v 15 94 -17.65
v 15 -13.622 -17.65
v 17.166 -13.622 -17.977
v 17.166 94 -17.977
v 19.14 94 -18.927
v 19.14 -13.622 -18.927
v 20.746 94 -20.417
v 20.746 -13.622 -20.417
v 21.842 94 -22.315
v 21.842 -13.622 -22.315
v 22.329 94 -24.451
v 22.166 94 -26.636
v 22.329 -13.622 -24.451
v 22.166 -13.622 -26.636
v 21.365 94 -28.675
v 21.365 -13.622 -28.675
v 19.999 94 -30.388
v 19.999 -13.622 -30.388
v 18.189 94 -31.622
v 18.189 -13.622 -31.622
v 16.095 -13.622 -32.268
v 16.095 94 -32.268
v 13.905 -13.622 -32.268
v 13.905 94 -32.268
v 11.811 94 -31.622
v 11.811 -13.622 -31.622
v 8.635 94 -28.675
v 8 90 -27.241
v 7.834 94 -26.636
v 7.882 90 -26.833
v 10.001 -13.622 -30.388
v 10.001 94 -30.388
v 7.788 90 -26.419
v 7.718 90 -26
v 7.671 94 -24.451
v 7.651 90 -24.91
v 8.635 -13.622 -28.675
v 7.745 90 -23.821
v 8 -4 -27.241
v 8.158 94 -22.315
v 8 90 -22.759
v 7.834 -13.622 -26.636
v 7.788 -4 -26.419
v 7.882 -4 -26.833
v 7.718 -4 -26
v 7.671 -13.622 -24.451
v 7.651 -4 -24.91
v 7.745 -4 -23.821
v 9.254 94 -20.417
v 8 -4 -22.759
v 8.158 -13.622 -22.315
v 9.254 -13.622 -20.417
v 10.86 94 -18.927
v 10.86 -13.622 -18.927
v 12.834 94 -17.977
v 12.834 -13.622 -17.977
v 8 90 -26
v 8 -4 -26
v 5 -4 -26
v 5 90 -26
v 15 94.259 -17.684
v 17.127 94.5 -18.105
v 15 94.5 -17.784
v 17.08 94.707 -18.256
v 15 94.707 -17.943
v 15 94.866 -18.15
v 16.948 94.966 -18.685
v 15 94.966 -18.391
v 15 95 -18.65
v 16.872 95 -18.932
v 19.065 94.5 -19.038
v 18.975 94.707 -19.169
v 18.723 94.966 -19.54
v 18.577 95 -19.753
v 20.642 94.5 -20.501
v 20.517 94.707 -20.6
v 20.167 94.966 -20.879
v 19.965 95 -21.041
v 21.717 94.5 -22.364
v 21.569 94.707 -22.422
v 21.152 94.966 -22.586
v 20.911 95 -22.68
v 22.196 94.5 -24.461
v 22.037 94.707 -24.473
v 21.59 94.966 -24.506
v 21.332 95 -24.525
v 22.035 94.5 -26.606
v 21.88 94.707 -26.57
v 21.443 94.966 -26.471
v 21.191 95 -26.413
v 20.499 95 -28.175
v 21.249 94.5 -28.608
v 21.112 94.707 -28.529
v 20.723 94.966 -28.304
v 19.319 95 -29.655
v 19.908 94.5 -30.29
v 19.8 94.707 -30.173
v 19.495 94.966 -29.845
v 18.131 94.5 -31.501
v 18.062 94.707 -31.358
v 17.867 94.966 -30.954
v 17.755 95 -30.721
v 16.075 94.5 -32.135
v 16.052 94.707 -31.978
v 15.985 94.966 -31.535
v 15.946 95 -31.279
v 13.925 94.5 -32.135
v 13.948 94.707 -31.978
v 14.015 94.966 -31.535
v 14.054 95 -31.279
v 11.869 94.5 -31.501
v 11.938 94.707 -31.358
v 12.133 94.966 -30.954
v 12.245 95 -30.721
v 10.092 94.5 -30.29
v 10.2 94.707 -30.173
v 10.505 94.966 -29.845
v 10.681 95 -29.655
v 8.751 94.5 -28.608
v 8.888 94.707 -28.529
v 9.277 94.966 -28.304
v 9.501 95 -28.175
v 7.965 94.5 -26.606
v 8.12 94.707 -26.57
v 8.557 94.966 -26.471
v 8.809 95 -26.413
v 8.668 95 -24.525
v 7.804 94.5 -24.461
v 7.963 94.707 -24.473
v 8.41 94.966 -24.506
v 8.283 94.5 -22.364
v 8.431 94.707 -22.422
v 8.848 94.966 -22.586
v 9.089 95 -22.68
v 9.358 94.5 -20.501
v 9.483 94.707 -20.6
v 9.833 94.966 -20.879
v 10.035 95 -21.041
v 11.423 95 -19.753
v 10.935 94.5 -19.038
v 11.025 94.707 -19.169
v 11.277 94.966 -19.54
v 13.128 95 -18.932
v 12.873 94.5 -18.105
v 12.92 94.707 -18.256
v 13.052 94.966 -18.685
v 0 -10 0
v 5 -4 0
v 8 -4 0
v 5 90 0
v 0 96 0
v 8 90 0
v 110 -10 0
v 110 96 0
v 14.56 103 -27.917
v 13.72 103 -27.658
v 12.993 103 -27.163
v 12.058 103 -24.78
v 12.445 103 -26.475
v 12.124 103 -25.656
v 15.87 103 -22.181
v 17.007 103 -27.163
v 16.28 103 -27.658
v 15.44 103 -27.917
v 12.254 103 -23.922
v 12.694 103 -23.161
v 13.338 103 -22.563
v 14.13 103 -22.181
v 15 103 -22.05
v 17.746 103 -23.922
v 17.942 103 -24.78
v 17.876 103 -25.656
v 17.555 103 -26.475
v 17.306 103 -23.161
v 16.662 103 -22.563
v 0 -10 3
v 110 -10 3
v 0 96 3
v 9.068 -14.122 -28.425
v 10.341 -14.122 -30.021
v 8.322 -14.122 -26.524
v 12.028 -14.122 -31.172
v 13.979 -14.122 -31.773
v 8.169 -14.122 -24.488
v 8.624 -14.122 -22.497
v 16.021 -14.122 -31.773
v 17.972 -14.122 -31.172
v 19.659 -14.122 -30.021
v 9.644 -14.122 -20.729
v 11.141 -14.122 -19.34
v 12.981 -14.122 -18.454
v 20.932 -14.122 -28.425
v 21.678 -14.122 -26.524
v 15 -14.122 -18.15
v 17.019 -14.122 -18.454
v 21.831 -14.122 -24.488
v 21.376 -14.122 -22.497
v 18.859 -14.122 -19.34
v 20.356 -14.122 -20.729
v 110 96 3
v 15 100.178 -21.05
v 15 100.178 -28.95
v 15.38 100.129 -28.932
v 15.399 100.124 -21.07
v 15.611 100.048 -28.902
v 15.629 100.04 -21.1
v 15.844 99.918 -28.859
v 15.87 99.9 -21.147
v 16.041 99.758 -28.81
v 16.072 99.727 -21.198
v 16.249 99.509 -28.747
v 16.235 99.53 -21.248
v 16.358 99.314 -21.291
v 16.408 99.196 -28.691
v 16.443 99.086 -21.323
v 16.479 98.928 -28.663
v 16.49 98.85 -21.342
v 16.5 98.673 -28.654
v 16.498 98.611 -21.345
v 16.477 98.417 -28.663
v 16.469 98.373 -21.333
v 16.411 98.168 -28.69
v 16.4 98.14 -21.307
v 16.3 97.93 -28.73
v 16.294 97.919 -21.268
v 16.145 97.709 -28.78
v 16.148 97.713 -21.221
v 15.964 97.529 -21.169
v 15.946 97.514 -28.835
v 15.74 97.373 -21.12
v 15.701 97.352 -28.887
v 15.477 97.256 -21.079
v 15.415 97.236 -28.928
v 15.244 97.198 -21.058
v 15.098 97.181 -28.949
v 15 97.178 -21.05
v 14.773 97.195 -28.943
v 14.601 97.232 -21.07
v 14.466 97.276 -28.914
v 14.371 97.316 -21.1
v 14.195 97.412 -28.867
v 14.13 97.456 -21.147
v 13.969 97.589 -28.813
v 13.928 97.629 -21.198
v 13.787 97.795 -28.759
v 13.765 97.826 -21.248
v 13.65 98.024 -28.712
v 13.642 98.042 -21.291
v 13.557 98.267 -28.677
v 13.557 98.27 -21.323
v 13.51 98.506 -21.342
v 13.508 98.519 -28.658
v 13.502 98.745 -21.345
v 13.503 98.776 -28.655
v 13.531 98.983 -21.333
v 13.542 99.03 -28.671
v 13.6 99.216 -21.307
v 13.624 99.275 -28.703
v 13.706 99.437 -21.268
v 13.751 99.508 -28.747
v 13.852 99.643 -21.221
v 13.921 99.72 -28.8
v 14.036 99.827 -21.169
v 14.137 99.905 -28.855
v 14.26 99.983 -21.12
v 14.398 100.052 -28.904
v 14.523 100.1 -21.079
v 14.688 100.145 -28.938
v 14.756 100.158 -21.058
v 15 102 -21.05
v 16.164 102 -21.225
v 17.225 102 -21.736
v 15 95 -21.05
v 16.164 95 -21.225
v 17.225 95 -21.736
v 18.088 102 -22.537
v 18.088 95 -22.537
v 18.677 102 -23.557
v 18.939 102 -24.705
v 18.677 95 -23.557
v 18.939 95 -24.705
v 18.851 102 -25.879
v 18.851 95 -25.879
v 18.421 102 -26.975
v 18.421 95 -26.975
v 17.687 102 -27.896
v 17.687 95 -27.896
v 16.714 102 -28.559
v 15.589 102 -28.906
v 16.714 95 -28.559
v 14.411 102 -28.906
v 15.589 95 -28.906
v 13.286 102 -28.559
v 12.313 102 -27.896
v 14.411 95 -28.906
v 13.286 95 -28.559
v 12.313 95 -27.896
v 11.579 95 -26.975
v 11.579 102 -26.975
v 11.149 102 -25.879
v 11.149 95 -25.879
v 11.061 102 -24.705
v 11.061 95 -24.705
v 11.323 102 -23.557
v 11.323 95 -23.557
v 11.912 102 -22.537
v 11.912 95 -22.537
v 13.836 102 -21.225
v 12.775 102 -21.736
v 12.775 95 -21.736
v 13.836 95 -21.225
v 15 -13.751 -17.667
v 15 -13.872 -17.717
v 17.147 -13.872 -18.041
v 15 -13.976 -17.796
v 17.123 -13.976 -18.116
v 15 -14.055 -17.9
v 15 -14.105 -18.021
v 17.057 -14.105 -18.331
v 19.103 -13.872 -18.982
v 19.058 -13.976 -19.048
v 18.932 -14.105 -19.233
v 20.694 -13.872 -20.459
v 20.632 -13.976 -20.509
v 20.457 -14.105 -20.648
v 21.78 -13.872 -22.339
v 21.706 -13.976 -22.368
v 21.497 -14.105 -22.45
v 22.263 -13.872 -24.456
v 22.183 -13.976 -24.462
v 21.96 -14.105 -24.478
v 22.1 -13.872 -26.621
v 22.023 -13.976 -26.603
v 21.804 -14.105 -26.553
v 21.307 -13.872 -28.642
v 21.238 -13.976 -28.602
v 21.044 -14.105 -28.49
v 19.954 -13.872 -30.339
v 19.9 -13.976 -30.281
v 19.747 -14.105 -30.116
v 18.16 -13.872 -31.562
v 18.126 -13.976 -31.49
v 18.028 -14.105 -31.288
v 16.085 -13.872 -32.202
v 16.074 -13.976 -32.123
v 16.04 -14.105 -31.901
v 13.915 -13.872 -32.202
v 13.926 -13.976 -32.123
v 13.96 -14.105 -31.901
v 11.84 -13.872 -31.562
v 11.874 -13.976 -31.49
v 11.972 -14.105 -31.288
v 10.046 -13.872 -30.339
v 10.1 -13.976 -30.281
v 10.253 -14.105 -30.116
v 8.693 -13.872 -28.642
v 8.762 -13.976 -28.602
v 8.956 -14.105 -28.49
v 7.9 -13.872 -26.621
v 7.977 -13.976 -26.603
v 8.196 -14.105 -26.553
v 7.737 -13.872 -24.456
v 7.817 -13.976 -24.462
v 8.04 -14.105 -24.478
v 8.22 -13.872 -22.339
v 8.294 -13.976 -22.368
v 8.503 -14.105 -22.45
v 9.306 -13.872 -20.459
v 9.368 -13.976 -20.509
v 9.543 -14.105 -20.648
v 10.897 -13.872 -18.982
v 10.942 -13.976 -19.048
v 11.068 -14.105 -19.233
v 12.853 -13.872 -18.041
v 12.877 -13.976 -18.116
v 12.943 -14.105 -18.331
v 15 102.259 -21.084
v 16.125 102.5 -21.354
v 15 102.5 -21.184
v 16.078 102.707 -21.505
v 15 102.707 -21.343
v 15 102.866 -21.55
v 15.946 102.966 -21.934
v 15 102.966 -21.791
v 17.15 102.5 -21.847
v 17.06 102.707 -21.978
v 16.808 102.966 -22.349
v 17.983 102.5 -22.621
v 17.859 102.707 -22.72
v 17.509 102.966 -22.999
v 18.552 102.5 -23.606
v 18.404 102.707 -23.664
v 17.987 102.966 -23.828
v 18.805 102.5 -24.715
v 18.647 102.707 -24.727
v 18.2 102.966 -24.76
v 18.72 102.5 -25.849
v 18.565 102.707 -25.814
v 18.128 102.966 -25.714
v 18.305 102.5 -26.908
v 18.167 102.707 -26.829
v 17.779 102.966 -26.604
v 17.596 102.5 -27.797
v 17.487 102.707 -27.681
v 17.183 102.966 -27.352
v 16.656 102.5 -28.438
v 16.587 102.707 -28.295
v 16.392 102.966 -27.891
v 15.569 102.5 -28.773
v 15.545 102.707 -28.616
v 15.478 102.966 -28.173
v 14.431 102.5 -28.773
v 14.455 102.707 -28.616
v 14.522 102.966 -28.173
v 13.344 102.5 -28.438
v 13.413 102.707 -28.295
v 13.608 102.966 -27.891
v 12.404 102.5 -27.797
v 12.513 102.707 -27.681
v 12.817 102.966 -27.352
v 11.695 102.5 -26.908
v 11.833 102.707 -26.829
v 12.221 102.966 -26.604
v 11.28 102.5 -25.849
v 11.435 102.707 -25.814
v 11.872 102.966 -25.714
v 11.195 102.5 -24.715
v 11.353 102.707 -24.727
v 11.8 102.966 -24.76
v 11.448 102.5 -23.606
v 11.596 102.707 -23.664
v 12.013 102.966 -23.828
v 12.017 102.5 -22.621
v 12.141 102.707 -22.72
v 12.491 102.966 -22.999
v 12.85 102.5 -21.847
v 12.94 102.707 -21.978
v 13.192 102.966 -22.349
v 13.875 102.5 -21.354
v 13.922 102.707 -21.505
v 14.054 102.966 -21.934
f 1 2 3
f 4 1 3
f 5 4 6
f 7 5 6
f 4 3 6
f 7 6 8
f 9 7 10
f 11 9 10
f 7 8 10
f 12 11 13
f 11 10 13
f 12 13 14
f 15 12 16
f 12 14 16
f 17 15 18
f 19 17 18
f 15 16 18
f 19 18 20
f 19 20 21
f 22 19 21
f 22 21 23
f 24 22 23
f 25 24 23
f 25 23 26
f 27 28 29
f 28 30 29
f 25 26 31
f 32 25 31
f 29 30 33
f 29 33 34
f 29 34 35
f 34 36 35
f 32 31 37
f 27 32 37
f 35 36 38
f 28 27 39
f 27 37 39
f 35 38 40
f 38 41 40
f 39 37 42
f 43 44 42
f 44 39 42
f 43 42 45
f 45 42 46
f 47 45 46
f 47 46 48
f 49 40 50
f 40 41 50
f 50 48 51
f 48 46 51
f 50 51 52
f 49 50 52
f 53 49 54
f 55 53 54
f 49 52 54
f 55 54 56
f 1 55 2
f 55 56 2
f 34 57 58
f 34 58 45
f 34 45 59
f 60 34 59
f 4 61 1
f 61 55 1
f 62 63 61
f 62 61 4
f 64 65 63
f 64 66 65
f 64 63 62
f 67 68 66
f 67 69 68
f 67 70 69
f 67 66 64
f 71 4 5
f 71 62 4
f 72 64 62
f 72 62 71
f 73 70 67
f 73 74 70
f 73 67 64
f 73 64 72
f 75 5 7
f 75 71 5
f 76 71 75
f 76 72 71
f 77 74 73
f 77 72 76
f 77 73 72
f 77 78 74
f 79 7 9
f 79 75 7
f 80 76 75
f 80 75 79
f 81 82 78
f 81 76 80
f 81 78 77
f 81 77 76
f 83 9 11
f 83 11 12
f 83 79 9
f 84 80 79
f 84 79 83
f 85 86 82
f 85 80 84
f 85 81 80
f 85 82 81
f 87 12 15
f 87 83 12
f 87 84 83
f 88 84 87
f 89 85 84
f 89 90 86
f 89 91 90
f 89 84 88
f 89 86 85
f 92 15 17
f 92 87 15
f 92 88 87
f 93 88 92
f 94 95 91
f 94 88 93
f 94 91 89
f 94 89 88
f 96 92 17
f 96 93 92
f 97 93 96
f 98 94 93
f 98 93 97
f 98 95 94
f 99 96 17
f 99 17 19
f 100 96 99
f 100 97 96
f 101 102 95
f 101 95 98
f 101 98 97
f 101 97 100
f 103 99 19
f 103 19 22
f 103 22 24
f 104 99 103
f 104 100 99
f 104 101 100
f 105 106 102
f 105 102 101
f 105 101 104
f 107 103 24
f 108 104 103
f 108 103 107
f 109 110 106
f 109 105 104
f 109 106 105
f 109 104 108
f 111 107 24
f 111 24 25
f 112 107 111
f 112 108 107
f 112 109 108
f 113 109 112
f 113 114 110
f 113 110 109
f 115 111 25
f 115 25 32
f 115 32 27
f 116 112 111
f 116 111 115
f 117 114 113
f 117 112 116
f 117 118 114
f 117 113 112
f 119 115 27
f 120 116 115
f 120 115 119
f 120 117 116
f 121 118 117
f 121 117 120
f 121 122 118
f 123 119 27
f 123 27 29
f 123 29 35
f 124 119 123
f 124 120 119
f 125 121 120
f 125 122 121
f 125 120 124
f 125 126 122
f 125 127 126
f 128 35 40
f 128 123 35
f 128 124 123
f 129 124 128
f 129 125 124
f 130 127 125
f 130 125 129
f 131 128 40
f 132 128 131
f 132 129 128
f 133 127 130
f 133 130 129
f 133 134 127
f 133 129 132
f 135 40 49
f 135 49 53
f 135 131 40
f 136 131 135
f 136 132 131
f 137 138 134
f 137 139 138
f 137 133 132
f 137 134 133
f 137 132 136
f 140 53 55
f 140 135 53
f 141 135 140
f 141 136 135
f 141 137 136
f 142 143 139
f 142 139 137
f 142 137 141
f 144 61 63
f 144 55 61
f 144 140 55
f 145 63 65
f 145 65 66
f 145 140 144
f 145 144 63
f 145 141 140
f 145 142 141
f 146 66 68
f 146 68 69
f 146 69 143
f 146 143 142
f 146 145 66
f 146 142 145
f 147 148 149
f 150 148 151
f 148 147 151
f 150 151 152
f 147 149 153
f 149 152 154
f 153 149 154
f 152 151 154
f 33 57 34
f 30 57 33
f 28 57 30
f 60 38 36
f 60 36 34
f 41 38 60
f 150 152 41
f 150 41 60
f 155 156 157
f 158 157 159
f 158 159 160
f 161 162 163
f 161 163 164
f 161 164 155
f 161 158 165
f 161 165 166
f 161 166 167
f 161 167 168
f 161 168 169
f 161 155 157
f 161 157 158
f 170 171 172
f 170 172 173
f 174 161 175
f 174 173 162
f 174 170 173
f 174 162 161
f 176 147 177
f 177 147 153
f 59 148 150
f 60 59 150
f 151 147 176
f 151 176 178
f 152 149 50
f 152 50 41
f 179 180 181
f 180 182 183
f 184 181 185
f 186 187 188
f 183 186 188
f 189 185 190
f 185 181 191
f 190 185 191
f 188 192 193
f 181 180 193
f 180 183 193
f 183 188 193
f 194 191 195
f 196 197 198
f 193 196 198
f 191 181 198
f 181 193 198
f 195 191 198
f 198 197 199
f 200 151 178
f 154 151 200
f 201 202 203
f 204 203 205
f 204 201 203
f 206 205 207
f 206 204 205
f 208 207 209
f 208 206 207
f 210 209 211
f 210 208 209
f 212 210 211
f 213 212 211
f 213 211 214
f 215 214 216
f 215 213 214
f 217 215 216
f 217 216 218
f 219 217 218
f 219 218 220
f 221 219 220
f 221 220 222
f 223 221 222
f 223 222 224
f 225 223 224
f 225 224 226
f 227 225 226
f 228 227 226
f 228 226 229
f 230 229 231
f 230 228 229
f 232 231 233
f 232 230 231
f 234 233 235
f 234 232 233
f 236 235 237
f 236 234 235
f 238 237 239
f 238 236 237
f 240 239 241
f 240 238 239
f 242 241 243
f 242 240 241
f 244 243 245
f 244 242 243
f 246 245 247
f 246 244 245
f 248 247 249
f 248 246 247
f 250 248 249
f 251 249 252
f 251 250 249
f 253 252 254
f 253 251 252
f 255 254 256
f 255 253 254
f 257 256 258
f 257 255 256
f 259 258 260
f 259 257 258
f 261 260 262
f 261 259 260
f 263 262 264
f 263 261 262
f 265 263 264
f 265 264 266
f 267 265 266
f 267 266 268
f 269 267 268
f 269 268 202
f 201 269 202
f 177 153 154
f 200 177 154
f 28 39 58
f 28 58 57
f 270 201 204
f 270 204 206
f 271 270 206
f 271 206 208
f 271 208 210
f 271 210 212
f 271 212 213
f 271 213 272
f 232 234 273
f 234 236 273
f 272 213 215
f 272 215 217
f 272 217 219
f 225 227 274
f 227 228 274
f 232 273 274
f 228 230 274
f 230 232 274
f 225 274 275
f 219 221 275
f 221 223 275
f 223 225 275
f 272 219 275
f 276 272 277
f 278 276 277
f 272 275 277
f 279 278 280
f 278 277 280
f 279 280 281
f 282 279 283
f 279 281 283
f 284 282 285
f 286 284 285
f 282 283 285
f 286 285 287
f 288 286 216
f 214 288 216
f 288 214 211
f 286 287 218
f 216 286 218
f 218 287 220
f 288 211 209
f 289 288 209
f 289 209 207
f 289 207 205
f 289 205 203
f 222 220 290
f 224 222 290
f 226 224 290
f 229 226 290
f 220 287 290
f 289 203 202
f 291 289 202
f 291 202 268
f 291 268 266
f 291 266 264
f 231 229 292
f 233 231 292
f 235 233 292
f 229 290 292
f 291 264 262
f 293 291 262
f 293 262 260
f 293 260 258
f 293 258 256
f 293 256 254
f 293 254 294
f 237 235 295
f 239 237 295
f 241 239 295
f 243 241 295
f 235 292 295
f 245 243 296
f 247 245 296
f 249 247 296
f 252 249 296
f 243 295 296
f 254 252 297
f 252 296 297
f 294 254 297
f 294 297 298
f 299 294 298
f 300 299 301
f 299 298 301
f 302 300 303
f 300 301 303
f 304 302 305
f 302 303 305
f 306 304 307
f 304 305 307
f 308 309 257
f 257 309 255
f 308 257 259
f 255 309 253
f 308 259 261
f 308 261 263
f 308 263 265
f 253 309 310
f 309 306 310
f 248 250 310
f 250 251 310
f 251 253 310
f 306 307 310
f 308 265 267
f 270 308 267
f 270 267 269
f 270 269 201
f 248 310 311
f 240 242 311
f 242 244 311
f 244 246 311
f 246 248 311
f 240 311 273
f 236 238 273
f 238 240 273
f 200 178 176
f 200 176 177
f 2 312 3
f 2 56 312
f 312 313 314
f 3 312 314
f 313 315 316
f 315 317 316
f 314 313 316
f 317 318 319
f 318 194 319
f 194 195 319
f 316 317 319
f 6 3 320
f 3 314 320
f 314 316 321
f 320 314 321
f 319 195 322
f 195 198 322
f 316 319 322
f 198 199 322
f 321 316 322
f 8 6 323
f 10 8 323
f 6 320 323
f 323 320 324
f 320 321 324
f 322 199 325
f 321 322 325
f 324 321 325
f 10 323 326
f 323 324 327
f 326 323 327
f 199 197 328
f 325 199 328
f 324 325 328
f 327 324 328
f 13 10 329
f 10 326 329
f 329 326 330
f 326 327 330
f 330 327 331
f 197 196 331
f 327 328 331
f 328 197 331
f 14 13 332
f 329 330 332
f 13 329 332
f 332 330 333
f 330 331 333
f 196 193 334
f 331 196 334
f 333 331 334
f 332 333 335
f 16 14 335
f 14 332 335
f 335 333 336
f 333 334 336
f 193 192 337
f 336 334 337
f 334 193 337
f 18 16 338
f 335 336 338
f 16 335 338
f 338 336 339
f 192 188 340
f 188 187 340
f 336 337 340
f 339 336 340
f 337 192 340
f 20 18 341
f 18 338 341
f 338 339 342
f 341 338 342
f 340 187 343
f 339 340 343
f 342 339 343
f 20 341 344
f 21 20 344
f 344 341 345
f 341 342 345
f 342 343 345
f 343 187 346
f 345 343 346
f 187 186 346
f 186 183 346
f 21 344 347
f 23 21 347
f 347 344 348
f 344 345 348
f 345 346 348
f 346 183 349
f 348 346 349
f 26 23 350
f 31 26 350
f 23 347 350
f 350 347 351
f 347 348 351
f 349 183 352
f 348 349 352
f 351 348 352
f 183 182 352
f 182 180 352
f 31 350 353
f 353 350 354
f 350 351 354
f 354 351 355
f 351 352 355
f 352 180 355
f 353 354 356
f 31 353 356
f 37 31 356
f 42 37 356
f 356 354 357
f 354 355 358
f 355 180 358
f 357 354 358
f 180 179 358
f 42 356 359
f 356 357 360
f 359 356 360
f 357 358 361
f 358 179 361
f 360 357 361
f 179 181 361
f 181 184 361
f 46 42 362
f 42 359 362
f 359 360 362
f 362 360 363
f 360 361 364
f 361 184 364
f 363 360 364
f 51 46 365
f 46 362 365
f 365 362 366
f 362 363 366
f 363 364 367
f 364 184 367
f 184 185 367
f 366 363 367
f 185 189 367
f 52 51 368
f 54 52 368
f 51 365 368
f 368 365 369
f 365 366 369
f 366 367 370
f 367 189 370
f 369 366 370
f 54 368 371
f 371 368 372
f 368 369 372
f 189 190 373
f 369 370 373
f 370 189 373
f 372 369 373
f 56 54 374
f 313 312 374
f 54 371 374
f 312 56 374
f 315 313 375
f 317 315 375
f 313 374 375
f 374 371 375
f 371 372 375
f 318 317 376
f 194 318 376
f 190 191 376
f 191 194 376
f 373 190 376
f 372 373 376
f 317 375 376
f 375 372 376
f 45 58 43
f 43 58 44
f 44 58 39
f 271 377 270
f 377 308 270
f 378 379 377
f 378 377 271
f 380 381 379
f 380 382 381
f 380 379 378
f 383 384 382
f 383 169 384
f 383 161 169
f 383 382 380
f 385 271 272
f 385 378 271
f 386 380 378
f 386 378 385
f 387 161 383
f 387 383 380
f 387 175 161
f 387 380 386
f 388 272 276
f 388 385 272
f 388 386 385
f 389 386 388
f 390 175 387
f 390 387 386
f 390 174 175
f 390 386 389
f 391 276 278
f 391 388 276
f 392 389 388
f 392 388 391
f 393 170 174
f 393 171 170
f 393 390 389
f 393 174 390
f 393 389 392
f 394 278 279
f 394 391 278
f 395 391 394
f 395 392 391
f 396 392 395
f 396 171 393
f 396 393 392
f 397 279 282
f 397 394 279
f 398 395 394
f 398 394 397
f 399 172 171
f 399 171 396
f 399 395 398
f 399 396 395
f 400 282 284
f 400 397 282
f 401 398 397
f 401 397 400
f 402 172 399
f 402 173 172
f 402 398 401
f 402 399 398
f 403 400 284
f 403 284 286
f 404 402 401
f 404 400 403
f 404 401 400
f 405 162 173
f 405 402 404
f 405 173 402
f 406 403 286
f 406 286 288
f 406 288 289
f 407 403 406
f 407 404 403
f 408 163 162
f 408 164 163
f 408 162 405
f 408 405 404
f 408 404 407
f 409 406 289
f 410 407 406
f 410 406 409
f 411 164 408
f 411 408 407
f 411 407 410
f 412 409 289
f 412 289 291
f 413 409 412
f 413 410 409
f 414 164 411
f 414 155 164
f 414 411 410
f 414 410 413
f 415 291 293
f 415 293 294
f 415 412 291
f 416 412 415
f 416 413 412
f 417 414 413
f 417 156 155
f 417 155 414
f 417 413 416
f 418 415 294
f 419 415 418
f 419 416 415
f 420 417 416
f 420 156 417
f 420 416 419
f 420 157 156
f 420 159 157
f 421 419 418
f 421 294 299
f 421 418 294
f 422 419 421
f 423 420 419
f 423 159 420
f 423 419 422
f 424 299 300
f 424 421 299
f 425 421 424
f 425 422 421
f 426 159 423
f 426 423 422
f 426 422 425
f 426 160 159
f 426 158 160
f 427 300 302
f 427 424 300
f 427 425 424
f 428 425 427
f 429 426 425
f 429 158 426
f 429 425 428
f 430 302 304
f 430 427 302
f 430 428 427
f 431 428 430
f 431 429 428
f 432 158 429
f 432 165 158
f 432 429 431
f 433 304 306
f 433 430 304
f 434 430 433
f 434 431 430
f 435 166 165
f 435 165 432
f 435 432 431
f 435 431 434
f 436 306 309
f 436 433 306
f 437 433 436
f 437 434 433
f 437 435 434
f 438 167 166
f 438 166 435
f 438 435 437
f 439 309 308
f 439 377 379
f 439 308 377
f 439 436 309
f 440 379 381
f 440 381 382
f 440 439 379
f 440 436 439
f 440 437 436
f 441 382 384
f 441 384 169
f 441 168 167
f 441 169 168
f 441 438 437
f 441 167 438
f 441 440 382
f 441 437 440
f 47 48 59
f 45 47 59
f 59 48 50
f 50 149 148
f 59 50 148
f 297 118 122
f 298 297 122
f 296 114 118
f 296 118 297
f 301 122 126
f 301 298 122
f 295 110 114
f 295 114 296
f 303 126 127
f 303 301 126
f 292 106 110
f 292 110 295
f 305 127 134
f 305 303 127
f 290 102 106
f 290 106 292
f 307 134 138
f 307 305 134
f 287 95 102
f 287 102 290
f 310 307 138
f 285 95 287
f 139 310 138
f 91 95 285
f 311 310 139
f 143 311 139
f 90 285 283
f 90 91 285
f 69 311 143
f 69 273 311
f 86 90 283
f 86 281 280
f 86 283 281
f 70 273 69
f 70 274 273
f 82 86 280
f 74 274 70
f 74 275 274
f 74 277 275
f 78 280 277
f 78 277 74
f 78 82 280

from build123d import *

# Parameters (mm, degrees)
SKETCH_1_W               = 110
SKETCH_1_H               = 106
EXTRUDE_1_DEPTH          = 3
SKETCH_2_W               = 3
SKETCH_2_H               = 94
EXTRUDE_2_DEPTH          = 38
EXTRUDE_3_DEPTH          = 5
EXTRUDE_3_DEPTH_BACK     = 104.122011
SKETCH_4_R               = 7.35
SKETCH_5_R               = 3.95
EXTRUDE_4_DEPTH          = 8
FILLET_2_R               = 1
CUT_EXTRUDE_1_DEPTH      = 155.044806793
CUT_EXTRUDE_1_DEPTH_BACK = 155.044806793
SKETCH_9_R               = 1.5
FILLET_3_R               = 0.5
SKETCH_11_W              = 3
SKETCH_11_H              = 94
CUT_EXTRUDE_3_DEPTH      = 12


with BuildPart() as part:
    # 草图1 → 凸台-拉伸1 (new body)
    with BuildSketch(Plane.XY):
        with Locations((55, 43)):
            Rectangle(SKETCH_1_W, SKETCH_1_H)
    extrude(amount=EXTRUDE_1_DEPTH)

    # 草图2 → 凸台-拉伸2 (add)
    with BuildSketch(Plane(origin=(0, 0, 0), x_dir=(-1, 0, 0), z_dir=(0, 0, -1))):
        with Locations((-6.5, 43)):
            Rectangle(SKETCH_2_W, SKETCH_2_H)
    extrude(amount=EXTRUDE_2_DEPTH)

    # 草图4 → 凸台-拉伸3 (add, two sides: drawn at the far end of the back side and taken through both)
    with BuildSketch(Plane(origin=(0, 90, 0), x_dir=(1, 0, 0), z_dir=(0, 1, 0)).offset(-EXTRUDE_3_DEPTH_BACK)):
        with Locations(Location((15, 25, 0), (0, 0, 270))):
            Circle(SKETCH_4_R)
    extrude(amount=EXTRUDE_3_DEPTH + EXTRUDE_3_DEPTH_BACK)

    # 草图5 → 凸台-拉伸4 (add)
    with BuildSketch(Plane(origin=(0, 95, 0), x_dir=(1, 0, 0), z_dir=(0, 1, 0))):
        with Locations(Location((15, 25, 0), (0, 0, 270))):
            Circle(SKETCH_5_R)
    extrude(amount=EXTRUDE_4_DEPTH)

    # 圆角2
    fillet_2_edges = [part.edges().sort_by_distance(p)[0] for p in [
        (15, 95, -32.35),
        (15, 103, -28.95),
    ]]
    fillet(fillet_2_edges, radius=FILLET_2_R)

    # 草图9 → 切除-拉伸1 (cut, two sides: drawn at the far end of the back side and taken through both)
    with BuildSketch(Plane(origin=(0, 0, -28.95), x_dir=(-1, 0, 0), z_dir=(0, 0, -1)).offset(-CUT_EXTRUDE_1_DEPTH_BACK)):
        with Locations(Location((-15, 98.677988735, 0), (0, 0, 90.000000013))):
            Circle(SKETCH_9_R)
    extrude(amount=CUT_EXTRUDE_1_DEPTH + CUT_EXTRUDE_1_DEPTH_BACK, mode=Mode.SUBTRACT)

    # 圆角3
    fillet_3_edges = [part.edges().sort_by_distance(p)[0] for p in [
        (15, -14.122011, -32.35),
    ]]
    fillet(fillet_3_edges, radius=FILLET_3_R)

    # 草图11 → 切除-拉伸3 (cut)
    with BuildSketch(Plane(origin=(0, 0, -38), x_dir=(-1, 0, 0), z_dir=(0, 0, -1))):
        with Locations((-6.5, 43)):
            Rectangle(SKETCH_11_W, SKETCH_11_H)
    extrude(amount=-CUT_EXTRUDE_3_DEPTH, mode=Mode.SUBTRACT)


solid = part.part
